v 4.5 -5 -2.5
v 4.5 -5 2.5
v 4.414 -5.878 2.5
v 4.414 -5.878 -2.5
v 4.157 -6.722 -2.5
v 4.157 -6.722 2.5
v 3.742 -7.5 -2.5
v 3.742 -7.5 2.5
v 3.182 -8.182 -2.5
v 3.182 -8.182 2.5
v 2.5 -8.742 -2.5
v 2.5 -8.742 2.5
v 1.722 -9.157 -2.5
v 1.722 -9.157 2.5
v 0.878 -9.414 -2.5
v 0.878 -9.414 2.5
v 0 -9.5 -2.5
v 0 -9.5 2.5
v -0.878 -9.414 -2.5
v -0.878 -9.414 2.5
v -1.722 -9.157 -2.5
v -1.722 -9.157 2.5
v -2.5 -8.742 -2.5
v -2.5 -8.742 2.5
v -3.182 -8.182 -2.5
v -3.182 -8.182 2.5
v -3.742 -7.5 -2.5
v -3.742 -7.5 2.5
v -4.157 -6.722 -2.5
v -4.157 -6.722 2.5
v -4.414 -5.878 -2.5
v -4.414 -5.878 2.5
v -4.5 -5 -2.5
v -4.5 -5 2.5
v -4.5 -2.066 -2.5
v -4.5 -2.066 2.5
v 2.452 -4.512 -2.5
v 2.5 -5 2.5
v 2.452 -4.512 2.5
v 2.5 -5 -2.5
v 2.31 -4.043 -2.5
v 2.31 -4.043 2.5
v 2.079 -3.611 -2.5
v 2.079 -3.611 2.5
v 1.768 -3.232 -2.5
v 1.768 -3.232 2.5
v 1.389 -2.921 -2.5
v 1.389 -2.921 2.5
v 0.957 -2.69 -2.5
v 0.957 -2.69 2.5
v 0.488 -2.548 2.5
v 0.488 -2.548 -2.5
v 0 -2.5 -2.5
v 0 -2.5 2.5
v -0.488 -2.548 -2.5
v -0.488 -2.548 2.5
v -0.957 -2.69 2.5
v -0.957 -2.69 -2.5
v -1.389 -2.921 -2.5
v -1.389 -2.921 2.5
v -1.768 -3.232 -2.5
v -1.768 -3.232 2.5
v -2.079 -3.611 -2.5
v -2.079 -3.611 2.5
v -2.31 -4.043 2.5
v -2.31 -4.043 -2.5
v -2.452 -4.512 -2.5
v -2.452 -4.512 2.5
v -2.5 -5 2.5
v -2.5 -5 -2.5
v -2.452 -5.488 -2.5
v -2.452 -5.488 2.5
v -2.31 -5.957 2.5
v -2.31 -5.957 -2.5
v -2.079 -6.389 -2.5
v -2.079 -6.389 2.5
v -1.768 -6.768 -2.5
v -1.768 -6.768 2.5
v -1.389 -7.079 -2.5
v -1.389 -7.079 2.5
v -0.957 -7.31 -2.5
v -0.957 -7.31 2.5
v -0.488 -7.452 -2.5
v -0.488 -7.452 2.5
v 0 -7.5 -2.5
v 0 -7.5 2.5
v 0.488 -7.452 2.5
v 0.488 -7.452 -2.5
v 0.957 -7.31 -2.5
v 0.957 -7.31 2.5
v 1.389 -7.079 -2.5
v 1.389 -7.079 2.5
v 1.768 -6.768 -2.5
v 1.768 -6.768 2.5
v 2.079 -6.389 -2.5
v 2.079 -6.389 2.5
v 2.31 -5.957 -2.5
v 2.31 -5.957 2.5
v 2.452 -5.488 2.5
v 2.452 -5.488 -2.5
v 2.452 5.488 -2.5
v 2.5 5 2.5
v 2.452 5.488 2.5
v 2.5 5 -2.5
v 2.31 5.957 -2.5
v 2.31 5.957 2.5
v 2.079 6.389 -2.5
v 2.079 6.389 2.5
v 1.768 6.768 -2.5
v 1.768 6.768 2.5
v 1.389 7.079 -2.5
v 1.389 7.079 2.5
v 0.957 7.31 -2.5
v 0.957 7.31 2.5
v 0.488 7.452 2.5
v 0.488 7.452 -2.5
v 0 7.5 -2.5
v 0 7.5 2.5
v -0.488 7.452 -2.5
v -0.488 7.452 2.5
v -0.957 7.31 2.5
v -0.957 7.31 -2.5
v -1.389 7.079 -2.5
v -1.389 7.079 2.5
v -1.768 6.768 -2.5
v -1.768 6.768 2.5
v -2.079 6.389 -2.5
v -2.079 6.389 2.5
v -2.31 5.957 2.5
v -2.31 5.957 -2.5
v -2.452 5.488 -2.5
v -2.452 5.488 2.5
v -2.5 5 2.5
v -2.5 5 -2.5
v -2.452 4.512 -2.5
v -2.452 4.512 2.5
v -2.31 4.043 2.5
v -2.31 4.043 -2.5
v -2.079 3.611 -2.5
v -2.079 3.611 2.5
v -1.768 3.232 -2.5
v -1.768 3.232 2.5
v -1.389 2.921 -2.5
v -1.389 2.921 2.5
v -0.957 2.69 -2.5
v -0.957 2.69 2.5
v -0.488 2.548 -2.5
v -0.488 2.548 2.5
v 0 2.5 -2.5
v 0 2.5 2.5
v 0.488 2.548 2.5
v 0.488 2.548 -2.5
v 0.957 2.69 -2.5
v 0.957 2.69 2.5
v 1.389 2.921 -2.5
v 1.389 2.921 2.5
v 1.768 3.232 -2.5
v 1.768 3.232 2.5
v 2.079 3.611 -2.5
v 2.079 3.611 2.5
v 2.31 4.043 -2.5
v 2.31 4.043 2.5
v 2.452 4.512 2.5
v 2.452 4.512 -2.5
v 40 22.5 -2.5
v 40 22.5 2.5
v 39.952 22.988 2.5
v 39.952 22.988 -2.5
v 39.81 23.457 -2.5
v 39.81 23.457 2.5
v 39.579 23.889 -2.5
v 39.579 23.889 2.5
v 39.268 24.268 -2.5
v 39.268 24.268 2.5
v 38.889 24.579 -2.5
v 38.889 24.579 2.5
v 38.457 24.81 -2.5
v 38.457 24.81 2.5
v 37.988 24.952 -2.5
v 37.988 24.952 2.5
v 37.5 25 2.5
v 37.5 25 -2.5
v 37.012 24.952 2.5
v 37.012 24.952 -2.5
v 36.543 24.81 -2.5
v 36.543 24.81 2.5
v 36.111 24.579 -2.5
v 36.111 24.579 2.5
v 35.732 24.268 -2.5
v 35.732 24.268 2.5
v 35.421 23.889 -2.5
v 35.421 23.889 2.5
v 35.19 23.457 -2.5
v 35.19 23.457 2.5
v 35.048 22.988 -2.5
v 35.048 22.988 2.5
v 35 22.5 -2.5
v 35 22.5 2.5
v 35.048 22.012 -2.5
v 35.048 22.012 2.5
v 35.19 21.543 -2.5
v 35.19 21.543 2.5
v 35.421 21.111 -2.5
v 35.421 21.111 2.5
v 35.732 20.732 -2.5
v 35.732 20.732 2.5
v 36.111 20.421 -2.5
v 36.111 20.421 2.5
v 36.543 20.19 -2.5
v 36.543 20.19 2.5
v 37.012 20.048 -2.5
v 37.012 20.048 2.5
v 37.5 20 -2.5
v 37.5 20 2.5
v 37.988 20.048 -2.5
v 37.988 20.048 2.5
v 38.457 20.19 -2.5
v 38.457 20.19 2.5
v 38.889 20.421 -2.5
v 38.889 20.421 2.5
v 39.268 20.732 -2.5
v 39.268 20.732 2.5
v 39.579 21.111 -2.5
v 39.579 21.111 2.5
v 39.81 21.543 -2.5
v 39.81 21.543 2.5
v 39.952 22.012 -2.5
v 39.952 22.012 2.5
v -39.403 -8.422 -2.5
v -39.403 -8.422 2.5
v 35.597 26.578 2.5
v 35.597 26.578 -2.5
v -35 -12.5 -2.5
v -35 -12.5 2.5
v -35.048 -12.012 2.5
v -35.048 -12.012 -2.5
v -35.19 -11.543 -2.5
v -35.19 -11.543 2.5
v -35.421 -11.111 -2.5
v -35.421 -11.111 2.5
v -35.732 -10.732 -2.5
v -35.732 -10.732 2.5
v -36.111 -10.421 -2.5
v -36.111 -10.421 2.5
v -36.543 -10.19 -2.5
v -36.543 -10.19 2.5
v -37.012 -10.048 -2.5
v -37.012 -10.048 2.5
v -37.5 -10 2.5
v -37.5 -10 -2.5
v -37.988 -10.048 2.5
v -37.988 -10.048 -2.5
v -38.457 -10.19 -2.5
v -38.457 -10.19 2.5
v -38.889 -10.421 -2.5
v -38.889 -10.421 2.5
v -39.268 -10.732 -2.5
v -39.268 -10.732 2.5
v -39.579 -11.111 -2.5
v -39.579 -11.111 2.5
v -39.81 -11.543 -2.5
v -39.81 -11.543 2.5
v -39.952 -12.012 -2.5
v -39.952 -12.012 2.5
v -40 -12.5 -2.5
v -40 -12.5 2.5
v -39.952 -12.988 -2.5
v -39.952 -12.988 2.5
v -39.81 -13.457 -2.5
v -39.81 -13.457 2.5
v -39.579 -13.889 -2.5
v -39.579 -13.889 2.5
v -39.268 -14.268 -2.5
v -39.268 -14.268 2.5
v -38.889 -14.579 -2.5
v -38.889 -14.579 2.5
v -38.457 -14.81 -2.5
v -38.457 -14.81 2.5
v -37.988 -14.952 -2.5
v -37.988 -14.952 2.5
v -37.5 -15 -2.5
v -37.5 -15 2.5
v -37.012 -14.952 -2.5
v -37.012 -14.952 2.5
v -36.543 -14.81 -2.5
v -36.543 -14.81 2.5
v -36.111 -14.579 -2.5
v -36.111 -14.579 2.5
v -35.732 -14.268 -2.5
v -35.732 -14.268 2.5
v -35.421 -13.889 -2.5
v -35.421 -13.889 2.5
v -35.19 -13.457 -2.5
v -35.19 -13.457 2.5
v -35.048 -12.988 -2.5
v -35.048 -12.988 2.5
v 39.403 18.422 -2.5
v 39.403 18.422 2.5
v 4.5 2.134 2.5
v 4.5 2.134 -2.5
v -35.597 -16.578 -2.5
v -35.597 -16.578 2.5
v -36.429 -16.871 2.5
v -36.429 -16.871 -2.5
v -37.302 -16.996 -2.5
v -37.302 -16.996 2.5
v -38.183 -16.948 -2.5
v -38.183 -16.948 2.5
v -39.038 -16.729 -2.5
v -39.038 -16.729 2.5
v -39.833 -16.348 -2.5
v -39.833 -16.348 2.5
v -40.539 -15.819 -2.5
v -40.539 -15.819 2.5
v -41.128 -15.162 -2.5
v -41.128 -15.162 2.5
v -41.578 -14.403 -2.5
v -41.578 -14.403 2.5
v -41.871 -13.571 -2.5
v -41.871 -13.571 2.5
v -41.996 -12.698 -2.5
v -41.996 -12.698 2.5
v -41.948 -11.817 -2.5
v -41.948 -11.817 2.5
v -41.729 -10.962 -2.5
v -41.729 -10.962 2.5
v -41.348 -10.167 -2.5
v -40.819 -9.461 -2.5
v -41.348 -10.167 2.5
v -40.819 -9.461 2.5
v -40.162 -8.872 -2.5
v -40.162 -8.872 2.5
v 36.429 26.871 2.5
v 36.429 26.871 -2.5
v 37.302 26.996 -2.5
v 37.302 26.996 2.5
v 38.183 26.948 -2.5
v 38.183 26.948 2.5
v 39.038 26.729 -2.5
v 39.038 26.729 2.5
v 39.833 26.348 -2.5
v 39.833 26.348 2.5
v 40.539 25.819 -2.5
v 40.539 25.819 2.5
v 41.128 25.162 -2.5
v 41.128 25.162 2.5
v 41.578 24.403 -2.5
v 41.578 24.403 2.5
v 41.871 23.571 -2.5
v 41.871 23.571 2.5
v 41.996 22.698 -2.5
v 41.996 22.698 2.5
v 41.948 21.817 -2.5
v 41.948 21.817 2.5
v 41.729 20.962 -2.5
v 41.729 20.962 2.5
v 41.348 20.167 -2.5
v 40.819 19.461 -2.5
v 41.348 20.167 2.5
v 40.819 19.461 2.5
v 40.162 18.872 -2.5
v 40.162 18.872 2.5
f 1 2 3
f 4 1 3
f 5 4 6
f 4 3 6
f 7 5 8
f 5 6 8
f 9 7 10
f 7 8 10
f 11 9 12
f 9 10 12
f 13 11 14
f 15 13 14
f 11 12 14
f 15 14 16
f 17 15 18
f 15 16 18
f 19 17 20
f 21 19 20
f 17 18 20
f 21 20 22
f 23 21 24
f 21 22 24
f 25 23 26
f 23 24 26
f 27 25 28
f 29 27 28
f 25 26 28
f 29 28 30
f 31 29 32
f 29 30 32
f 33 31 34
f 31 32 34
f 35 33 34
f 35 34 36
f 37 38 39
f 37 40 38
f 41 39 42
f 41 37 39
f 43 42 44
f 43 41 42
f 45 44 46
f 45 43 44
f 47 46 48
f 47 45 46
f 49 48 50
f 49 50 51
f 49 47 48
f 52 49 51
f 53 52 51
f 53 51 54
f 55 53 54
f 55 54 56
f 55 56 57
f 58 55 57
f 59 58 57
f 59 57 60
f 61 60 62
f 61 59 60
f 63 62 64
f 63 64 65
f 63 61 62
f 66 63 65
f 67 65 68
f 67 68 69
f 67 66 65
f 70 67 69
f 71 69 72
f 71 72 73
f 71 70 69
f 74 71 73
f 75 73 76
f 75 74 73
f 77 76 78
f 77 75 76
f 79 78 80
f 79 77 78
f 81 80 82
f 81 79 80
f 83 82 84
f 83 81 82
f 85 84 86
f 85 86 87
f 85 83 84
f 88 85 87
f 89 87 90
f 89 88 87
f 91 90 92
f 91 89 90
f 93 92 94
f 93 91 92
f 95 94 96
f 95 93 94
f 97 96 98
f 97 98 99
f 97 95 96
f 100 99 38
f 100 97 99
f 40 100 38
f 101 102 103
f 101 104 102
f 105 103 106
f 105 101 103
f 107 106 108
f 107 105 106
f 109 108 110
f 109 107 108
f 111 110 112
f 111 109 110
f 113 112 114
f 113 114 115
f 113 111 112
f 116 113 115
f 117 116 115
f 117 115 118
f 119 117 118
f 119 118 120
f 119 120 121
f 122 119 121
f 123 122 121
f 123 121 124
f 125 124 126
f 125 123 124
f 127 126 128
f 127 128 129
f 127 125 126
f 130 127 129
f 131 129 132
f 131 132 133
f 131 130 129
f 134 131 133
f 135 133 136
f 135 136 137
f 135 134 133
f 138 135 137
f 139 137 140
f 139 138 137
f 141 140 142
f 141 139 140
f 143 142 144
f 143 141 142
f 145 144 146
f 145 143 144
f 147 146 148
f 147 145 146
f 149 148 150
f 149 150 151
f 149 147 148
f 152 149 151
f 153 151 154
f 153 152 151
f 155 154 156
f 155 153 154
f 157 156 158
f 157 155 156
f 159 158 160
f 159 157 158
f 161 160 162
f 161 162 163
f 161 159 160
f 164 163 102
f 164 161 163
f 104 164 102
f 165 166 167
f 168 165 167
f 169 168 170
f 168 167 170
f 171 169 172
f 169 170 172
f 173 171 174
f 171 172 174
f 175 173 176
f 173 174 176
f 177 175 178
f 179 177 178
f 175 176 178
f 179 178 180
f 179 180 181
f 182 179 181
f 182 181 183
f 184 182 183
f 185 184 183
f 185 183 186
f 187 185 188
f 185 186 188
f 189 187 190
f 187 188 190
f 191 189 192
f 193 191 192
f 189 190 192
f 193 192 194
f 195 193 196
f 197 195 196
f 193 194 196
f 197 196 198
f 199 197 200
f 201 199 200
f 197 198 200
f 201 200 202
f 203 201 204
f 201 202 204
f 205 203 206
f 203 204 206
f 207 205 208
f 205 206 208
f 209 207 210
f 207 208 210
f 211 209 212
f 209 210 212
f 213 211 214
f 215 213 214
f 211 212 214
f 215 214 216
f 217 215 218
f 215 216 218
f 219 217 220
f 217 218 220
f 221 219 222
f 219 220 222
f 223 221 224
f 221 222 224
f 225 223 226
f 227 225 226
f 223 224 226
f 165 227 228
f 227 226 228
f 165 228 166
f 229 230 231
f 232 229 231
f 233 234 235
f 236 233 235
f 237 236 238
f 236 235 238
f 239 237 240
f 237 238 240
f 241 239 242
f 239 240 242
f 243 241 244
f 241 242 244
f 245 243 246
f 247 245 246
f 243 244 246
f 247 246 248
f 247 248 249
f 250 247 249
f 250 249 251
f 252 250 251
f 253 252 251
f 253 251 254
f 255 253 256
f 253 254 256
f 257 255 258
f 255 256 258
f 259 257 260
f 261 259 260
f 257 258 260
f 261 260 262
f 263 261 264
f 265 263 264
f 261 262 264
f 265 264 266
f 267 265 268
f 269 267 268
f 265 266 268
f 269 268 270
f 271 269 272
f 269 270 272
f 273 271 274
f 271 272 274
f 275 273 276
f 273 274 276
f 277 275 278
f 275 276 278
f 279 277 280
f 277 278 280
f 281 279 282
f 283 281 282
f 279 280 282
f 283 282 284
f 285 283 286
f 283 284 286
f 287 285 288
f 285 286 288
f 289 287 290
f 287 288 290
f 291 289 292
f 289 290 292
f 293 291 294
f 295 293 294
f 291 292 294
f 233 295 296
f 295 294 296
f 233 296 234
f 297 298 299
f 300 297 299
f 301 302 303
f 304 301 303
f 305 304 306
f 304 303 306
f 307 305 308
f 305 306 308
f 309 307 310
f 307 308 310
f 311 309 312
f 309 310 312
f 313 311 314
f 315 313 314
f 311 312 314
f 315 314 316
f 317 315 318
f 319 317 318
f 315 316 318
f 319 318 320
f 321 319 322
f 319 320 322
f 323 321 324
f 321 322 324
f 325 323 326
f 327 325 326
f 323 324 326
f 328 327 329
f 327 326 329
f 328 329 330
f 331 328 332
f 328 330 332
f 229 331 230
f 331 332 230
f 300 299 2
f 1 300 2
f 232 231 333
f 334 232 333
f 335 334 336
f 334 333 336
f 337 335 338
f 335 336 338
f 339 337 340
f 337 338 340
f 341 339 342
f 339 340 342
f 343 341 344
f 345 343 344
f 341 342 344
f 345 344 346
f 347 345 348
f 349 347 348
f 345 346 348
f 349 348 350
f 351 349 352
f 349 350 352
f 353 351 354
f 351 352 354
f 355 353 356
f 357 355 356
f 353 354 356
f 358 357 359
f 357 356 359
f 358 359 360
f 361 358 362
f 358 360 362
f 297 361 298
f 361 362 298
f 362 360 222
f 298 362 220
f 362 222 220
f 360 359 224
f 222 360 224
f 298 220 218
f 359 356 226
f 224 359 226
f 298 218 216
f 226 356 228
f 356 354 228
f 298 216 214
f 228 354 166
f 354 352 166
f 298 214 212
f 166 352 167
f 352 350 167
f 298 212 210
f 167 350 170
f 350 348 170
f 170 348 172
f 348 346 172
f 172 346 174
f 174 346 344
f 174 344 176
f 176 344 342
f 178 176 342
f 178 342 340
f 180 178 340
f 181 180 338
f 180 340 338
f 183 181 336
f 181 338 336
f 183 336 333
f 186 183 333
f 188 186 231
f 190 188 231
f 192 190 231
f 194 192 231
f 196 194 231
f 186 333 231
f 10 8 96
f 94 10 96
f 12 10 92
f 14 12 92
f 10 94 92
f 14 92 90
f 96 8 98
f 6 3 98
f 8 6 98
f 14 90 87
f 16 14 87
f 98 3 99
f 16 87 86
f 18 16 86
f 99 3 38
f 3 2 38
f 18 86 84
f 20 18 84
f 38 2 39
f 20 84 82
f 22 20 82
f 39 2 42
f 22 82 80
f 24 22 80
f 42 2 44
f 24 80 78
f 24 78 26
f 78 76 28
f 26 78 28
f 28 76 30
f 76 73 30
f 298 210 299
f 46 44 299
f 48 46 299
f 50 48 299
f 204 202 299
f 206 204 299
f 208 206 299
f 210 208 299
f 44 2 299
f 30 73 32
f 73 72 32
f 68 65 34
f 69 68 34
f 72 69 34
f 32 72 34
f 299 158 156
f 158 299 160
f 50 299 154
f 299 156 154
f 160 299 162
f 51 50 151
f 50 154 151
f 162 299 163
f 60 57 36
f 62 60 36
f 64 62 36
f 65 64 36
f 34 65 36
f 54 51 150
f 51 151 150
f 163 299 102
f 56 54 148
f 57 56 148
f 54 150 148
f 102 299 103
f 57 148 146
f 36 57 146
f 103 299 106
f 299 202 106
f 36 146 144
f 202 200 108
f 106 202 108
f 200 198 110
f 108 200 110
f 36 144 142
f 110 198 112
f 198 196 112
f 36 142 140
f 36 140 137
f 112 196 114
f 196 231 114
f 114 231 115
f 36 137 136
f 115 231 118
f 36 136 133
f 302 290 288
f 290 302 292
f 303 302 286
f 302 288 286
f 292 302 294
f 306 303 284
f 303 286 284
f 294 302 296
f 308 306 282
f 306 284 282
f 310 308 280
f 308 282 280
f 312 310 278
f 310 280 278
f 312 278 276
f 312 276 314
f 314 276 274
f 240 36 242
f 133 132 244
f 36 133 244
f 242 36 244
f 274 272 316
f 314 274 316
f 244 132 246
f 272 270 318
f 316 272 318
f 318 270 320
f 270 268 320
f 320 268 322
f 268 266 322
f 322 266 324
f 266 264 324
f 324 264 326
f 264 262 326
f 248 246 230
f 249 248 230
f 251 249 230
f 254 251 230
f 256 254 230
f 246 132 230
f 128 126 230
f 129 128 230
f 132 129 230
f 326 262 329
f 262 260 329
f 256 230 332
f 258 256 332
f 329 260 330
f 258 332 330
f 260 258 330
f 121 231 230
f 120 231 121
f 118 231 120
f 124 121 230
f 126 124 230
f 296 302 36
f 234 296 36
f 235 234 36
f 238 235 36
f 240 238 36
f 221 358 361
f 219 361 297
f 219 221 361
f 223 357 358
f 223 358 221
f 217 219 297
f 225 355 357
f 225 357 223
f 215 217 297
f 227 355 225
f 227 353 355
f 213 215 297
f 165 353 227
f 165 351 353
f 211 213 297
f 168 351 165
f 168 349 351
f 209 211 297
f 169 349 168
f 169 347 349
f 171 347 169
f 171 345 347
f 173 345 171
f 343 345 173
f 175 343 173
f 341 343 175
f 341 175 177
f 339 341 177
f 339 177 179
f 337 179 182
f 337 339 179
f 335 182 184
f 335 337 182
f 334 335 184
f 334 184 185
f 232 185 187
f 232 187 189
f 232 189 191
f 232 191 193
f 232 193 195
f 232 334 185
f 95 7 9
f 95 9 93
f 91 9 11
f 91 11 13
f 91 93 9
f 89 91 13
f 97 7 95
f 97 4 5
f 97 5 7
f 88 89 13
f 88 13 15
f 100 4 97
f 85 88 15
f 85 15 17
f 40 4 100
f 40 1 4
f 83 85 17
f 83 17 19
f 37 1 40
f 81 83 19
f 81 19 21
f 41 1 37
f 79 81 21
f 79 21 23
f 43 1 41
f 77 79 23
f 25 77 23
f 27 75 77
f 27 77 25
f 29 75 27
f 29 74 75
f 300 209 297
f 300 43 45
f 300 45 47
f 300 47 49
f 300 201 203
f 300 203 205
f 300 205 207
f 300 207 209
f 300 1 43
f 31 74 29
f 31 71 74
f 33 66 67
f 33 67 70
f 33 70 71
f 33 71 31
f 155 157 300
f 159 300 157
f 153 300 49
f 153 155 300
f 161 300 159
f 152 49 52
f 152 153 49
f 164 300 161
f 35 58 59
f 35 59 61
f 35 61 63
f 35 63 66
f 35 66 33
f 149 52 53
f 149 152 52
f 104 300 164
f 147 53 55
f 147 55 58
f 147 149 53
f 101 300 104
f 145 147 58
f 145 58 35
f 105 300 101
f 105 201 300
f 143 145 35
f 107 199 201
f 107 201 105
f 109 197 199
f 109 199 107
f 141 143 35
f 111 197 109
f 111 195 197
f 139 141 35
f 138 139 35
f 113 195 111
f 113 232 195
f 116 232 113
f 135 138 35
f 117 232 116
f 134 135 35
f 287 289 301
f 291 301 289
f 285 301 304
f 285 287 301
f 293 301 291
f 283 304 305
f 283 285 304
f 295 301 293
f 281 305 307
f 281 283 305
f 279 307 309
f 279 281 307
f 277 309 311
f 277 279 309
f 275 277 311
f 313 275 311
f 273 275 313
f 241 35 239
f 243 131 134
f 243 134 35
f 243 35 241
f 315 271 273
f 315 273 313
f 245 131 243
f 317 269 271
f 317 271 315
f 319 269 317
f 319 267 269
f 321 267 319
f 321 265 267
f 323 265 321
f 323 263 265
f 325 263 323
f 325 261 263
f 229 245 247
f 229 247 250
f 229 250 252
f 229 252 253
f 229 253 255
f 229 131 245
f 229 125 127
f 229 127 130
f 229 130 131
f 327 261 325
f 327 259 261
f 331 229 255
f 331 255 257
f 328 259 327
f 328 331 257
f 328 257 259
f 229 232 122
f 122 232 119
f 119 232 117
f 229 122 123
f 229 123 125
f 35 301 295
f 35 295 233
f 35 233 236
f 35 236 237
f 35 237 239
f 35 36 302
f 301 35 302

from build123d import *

# Parameters (mm, degrees)
SKETCH_1_R      = 2.5
EXTRUDE_1_DEPTH = 2.5
SKETCH_2_R      = 2.5
EXTRUDE_2_DEPTH = 5


with BuildPart() as part:
    # 草图1 → 凸台-拉伸1 (new body, symmetric)
    with BuildSketch(Plane.XY):
        with BuildLine():
            Line((-4.5, -5), (-4.5, 5))
            ThreePointArc((-4.5, 5), (0, 9.5), (4.5, 5))
            Line((4.5, 5), (4.5, -5))
            ThreePointArc((4.5, -5), (0, -9.5), (-4.5, -5))
        make_face()
        with Locations((0, 5)):
            Circle(SKETCH_1_R, mode=Mode.SUBTRACT)
        with Locations((0, -5)):
            Circle(SKETCH_1_R, mode=Mode.SUBTRACT)
    extrude(amount=EXTRUDE_1_DEPTH, both=True)

    # 草图2 → 凸台-拉伸2 (add)
    with BuildSketch(Plane.XY.offset(2.5)):
        with BuildLine():
            Line((-39.402984594, -8.42217587), (35.597015406, 26.57782413))
            ThreePointArc((35.597015406, 26.57782413), (41.57782413, 24.402984594), (39.402984594, 18.42217587))
            Line((39.402984594, 18.42217587), (-35.597015406, -16.57782413))
            ThreePointArc((-35.597015406, -16.57782413), (-41.57782413, -14.402984594), (-39.402984594, -8.42217587))
        make_face()
        with Locations((-37.5, -12.5)):
            Circle(SKETCH_2_R, mode=Mode.SUBTRACT)
        with Locations((37.5, 22.5)):
            Circle(SKETCH_2_R, mode=Mode.SUBTRACT)
        with Locations((0, 5)):
            Circle(SKETCH_2_R, mode=Mode.SUBTRACT)
    extrude(amount=-EXTRUDE_2_DEPTH)


solid = part.part
